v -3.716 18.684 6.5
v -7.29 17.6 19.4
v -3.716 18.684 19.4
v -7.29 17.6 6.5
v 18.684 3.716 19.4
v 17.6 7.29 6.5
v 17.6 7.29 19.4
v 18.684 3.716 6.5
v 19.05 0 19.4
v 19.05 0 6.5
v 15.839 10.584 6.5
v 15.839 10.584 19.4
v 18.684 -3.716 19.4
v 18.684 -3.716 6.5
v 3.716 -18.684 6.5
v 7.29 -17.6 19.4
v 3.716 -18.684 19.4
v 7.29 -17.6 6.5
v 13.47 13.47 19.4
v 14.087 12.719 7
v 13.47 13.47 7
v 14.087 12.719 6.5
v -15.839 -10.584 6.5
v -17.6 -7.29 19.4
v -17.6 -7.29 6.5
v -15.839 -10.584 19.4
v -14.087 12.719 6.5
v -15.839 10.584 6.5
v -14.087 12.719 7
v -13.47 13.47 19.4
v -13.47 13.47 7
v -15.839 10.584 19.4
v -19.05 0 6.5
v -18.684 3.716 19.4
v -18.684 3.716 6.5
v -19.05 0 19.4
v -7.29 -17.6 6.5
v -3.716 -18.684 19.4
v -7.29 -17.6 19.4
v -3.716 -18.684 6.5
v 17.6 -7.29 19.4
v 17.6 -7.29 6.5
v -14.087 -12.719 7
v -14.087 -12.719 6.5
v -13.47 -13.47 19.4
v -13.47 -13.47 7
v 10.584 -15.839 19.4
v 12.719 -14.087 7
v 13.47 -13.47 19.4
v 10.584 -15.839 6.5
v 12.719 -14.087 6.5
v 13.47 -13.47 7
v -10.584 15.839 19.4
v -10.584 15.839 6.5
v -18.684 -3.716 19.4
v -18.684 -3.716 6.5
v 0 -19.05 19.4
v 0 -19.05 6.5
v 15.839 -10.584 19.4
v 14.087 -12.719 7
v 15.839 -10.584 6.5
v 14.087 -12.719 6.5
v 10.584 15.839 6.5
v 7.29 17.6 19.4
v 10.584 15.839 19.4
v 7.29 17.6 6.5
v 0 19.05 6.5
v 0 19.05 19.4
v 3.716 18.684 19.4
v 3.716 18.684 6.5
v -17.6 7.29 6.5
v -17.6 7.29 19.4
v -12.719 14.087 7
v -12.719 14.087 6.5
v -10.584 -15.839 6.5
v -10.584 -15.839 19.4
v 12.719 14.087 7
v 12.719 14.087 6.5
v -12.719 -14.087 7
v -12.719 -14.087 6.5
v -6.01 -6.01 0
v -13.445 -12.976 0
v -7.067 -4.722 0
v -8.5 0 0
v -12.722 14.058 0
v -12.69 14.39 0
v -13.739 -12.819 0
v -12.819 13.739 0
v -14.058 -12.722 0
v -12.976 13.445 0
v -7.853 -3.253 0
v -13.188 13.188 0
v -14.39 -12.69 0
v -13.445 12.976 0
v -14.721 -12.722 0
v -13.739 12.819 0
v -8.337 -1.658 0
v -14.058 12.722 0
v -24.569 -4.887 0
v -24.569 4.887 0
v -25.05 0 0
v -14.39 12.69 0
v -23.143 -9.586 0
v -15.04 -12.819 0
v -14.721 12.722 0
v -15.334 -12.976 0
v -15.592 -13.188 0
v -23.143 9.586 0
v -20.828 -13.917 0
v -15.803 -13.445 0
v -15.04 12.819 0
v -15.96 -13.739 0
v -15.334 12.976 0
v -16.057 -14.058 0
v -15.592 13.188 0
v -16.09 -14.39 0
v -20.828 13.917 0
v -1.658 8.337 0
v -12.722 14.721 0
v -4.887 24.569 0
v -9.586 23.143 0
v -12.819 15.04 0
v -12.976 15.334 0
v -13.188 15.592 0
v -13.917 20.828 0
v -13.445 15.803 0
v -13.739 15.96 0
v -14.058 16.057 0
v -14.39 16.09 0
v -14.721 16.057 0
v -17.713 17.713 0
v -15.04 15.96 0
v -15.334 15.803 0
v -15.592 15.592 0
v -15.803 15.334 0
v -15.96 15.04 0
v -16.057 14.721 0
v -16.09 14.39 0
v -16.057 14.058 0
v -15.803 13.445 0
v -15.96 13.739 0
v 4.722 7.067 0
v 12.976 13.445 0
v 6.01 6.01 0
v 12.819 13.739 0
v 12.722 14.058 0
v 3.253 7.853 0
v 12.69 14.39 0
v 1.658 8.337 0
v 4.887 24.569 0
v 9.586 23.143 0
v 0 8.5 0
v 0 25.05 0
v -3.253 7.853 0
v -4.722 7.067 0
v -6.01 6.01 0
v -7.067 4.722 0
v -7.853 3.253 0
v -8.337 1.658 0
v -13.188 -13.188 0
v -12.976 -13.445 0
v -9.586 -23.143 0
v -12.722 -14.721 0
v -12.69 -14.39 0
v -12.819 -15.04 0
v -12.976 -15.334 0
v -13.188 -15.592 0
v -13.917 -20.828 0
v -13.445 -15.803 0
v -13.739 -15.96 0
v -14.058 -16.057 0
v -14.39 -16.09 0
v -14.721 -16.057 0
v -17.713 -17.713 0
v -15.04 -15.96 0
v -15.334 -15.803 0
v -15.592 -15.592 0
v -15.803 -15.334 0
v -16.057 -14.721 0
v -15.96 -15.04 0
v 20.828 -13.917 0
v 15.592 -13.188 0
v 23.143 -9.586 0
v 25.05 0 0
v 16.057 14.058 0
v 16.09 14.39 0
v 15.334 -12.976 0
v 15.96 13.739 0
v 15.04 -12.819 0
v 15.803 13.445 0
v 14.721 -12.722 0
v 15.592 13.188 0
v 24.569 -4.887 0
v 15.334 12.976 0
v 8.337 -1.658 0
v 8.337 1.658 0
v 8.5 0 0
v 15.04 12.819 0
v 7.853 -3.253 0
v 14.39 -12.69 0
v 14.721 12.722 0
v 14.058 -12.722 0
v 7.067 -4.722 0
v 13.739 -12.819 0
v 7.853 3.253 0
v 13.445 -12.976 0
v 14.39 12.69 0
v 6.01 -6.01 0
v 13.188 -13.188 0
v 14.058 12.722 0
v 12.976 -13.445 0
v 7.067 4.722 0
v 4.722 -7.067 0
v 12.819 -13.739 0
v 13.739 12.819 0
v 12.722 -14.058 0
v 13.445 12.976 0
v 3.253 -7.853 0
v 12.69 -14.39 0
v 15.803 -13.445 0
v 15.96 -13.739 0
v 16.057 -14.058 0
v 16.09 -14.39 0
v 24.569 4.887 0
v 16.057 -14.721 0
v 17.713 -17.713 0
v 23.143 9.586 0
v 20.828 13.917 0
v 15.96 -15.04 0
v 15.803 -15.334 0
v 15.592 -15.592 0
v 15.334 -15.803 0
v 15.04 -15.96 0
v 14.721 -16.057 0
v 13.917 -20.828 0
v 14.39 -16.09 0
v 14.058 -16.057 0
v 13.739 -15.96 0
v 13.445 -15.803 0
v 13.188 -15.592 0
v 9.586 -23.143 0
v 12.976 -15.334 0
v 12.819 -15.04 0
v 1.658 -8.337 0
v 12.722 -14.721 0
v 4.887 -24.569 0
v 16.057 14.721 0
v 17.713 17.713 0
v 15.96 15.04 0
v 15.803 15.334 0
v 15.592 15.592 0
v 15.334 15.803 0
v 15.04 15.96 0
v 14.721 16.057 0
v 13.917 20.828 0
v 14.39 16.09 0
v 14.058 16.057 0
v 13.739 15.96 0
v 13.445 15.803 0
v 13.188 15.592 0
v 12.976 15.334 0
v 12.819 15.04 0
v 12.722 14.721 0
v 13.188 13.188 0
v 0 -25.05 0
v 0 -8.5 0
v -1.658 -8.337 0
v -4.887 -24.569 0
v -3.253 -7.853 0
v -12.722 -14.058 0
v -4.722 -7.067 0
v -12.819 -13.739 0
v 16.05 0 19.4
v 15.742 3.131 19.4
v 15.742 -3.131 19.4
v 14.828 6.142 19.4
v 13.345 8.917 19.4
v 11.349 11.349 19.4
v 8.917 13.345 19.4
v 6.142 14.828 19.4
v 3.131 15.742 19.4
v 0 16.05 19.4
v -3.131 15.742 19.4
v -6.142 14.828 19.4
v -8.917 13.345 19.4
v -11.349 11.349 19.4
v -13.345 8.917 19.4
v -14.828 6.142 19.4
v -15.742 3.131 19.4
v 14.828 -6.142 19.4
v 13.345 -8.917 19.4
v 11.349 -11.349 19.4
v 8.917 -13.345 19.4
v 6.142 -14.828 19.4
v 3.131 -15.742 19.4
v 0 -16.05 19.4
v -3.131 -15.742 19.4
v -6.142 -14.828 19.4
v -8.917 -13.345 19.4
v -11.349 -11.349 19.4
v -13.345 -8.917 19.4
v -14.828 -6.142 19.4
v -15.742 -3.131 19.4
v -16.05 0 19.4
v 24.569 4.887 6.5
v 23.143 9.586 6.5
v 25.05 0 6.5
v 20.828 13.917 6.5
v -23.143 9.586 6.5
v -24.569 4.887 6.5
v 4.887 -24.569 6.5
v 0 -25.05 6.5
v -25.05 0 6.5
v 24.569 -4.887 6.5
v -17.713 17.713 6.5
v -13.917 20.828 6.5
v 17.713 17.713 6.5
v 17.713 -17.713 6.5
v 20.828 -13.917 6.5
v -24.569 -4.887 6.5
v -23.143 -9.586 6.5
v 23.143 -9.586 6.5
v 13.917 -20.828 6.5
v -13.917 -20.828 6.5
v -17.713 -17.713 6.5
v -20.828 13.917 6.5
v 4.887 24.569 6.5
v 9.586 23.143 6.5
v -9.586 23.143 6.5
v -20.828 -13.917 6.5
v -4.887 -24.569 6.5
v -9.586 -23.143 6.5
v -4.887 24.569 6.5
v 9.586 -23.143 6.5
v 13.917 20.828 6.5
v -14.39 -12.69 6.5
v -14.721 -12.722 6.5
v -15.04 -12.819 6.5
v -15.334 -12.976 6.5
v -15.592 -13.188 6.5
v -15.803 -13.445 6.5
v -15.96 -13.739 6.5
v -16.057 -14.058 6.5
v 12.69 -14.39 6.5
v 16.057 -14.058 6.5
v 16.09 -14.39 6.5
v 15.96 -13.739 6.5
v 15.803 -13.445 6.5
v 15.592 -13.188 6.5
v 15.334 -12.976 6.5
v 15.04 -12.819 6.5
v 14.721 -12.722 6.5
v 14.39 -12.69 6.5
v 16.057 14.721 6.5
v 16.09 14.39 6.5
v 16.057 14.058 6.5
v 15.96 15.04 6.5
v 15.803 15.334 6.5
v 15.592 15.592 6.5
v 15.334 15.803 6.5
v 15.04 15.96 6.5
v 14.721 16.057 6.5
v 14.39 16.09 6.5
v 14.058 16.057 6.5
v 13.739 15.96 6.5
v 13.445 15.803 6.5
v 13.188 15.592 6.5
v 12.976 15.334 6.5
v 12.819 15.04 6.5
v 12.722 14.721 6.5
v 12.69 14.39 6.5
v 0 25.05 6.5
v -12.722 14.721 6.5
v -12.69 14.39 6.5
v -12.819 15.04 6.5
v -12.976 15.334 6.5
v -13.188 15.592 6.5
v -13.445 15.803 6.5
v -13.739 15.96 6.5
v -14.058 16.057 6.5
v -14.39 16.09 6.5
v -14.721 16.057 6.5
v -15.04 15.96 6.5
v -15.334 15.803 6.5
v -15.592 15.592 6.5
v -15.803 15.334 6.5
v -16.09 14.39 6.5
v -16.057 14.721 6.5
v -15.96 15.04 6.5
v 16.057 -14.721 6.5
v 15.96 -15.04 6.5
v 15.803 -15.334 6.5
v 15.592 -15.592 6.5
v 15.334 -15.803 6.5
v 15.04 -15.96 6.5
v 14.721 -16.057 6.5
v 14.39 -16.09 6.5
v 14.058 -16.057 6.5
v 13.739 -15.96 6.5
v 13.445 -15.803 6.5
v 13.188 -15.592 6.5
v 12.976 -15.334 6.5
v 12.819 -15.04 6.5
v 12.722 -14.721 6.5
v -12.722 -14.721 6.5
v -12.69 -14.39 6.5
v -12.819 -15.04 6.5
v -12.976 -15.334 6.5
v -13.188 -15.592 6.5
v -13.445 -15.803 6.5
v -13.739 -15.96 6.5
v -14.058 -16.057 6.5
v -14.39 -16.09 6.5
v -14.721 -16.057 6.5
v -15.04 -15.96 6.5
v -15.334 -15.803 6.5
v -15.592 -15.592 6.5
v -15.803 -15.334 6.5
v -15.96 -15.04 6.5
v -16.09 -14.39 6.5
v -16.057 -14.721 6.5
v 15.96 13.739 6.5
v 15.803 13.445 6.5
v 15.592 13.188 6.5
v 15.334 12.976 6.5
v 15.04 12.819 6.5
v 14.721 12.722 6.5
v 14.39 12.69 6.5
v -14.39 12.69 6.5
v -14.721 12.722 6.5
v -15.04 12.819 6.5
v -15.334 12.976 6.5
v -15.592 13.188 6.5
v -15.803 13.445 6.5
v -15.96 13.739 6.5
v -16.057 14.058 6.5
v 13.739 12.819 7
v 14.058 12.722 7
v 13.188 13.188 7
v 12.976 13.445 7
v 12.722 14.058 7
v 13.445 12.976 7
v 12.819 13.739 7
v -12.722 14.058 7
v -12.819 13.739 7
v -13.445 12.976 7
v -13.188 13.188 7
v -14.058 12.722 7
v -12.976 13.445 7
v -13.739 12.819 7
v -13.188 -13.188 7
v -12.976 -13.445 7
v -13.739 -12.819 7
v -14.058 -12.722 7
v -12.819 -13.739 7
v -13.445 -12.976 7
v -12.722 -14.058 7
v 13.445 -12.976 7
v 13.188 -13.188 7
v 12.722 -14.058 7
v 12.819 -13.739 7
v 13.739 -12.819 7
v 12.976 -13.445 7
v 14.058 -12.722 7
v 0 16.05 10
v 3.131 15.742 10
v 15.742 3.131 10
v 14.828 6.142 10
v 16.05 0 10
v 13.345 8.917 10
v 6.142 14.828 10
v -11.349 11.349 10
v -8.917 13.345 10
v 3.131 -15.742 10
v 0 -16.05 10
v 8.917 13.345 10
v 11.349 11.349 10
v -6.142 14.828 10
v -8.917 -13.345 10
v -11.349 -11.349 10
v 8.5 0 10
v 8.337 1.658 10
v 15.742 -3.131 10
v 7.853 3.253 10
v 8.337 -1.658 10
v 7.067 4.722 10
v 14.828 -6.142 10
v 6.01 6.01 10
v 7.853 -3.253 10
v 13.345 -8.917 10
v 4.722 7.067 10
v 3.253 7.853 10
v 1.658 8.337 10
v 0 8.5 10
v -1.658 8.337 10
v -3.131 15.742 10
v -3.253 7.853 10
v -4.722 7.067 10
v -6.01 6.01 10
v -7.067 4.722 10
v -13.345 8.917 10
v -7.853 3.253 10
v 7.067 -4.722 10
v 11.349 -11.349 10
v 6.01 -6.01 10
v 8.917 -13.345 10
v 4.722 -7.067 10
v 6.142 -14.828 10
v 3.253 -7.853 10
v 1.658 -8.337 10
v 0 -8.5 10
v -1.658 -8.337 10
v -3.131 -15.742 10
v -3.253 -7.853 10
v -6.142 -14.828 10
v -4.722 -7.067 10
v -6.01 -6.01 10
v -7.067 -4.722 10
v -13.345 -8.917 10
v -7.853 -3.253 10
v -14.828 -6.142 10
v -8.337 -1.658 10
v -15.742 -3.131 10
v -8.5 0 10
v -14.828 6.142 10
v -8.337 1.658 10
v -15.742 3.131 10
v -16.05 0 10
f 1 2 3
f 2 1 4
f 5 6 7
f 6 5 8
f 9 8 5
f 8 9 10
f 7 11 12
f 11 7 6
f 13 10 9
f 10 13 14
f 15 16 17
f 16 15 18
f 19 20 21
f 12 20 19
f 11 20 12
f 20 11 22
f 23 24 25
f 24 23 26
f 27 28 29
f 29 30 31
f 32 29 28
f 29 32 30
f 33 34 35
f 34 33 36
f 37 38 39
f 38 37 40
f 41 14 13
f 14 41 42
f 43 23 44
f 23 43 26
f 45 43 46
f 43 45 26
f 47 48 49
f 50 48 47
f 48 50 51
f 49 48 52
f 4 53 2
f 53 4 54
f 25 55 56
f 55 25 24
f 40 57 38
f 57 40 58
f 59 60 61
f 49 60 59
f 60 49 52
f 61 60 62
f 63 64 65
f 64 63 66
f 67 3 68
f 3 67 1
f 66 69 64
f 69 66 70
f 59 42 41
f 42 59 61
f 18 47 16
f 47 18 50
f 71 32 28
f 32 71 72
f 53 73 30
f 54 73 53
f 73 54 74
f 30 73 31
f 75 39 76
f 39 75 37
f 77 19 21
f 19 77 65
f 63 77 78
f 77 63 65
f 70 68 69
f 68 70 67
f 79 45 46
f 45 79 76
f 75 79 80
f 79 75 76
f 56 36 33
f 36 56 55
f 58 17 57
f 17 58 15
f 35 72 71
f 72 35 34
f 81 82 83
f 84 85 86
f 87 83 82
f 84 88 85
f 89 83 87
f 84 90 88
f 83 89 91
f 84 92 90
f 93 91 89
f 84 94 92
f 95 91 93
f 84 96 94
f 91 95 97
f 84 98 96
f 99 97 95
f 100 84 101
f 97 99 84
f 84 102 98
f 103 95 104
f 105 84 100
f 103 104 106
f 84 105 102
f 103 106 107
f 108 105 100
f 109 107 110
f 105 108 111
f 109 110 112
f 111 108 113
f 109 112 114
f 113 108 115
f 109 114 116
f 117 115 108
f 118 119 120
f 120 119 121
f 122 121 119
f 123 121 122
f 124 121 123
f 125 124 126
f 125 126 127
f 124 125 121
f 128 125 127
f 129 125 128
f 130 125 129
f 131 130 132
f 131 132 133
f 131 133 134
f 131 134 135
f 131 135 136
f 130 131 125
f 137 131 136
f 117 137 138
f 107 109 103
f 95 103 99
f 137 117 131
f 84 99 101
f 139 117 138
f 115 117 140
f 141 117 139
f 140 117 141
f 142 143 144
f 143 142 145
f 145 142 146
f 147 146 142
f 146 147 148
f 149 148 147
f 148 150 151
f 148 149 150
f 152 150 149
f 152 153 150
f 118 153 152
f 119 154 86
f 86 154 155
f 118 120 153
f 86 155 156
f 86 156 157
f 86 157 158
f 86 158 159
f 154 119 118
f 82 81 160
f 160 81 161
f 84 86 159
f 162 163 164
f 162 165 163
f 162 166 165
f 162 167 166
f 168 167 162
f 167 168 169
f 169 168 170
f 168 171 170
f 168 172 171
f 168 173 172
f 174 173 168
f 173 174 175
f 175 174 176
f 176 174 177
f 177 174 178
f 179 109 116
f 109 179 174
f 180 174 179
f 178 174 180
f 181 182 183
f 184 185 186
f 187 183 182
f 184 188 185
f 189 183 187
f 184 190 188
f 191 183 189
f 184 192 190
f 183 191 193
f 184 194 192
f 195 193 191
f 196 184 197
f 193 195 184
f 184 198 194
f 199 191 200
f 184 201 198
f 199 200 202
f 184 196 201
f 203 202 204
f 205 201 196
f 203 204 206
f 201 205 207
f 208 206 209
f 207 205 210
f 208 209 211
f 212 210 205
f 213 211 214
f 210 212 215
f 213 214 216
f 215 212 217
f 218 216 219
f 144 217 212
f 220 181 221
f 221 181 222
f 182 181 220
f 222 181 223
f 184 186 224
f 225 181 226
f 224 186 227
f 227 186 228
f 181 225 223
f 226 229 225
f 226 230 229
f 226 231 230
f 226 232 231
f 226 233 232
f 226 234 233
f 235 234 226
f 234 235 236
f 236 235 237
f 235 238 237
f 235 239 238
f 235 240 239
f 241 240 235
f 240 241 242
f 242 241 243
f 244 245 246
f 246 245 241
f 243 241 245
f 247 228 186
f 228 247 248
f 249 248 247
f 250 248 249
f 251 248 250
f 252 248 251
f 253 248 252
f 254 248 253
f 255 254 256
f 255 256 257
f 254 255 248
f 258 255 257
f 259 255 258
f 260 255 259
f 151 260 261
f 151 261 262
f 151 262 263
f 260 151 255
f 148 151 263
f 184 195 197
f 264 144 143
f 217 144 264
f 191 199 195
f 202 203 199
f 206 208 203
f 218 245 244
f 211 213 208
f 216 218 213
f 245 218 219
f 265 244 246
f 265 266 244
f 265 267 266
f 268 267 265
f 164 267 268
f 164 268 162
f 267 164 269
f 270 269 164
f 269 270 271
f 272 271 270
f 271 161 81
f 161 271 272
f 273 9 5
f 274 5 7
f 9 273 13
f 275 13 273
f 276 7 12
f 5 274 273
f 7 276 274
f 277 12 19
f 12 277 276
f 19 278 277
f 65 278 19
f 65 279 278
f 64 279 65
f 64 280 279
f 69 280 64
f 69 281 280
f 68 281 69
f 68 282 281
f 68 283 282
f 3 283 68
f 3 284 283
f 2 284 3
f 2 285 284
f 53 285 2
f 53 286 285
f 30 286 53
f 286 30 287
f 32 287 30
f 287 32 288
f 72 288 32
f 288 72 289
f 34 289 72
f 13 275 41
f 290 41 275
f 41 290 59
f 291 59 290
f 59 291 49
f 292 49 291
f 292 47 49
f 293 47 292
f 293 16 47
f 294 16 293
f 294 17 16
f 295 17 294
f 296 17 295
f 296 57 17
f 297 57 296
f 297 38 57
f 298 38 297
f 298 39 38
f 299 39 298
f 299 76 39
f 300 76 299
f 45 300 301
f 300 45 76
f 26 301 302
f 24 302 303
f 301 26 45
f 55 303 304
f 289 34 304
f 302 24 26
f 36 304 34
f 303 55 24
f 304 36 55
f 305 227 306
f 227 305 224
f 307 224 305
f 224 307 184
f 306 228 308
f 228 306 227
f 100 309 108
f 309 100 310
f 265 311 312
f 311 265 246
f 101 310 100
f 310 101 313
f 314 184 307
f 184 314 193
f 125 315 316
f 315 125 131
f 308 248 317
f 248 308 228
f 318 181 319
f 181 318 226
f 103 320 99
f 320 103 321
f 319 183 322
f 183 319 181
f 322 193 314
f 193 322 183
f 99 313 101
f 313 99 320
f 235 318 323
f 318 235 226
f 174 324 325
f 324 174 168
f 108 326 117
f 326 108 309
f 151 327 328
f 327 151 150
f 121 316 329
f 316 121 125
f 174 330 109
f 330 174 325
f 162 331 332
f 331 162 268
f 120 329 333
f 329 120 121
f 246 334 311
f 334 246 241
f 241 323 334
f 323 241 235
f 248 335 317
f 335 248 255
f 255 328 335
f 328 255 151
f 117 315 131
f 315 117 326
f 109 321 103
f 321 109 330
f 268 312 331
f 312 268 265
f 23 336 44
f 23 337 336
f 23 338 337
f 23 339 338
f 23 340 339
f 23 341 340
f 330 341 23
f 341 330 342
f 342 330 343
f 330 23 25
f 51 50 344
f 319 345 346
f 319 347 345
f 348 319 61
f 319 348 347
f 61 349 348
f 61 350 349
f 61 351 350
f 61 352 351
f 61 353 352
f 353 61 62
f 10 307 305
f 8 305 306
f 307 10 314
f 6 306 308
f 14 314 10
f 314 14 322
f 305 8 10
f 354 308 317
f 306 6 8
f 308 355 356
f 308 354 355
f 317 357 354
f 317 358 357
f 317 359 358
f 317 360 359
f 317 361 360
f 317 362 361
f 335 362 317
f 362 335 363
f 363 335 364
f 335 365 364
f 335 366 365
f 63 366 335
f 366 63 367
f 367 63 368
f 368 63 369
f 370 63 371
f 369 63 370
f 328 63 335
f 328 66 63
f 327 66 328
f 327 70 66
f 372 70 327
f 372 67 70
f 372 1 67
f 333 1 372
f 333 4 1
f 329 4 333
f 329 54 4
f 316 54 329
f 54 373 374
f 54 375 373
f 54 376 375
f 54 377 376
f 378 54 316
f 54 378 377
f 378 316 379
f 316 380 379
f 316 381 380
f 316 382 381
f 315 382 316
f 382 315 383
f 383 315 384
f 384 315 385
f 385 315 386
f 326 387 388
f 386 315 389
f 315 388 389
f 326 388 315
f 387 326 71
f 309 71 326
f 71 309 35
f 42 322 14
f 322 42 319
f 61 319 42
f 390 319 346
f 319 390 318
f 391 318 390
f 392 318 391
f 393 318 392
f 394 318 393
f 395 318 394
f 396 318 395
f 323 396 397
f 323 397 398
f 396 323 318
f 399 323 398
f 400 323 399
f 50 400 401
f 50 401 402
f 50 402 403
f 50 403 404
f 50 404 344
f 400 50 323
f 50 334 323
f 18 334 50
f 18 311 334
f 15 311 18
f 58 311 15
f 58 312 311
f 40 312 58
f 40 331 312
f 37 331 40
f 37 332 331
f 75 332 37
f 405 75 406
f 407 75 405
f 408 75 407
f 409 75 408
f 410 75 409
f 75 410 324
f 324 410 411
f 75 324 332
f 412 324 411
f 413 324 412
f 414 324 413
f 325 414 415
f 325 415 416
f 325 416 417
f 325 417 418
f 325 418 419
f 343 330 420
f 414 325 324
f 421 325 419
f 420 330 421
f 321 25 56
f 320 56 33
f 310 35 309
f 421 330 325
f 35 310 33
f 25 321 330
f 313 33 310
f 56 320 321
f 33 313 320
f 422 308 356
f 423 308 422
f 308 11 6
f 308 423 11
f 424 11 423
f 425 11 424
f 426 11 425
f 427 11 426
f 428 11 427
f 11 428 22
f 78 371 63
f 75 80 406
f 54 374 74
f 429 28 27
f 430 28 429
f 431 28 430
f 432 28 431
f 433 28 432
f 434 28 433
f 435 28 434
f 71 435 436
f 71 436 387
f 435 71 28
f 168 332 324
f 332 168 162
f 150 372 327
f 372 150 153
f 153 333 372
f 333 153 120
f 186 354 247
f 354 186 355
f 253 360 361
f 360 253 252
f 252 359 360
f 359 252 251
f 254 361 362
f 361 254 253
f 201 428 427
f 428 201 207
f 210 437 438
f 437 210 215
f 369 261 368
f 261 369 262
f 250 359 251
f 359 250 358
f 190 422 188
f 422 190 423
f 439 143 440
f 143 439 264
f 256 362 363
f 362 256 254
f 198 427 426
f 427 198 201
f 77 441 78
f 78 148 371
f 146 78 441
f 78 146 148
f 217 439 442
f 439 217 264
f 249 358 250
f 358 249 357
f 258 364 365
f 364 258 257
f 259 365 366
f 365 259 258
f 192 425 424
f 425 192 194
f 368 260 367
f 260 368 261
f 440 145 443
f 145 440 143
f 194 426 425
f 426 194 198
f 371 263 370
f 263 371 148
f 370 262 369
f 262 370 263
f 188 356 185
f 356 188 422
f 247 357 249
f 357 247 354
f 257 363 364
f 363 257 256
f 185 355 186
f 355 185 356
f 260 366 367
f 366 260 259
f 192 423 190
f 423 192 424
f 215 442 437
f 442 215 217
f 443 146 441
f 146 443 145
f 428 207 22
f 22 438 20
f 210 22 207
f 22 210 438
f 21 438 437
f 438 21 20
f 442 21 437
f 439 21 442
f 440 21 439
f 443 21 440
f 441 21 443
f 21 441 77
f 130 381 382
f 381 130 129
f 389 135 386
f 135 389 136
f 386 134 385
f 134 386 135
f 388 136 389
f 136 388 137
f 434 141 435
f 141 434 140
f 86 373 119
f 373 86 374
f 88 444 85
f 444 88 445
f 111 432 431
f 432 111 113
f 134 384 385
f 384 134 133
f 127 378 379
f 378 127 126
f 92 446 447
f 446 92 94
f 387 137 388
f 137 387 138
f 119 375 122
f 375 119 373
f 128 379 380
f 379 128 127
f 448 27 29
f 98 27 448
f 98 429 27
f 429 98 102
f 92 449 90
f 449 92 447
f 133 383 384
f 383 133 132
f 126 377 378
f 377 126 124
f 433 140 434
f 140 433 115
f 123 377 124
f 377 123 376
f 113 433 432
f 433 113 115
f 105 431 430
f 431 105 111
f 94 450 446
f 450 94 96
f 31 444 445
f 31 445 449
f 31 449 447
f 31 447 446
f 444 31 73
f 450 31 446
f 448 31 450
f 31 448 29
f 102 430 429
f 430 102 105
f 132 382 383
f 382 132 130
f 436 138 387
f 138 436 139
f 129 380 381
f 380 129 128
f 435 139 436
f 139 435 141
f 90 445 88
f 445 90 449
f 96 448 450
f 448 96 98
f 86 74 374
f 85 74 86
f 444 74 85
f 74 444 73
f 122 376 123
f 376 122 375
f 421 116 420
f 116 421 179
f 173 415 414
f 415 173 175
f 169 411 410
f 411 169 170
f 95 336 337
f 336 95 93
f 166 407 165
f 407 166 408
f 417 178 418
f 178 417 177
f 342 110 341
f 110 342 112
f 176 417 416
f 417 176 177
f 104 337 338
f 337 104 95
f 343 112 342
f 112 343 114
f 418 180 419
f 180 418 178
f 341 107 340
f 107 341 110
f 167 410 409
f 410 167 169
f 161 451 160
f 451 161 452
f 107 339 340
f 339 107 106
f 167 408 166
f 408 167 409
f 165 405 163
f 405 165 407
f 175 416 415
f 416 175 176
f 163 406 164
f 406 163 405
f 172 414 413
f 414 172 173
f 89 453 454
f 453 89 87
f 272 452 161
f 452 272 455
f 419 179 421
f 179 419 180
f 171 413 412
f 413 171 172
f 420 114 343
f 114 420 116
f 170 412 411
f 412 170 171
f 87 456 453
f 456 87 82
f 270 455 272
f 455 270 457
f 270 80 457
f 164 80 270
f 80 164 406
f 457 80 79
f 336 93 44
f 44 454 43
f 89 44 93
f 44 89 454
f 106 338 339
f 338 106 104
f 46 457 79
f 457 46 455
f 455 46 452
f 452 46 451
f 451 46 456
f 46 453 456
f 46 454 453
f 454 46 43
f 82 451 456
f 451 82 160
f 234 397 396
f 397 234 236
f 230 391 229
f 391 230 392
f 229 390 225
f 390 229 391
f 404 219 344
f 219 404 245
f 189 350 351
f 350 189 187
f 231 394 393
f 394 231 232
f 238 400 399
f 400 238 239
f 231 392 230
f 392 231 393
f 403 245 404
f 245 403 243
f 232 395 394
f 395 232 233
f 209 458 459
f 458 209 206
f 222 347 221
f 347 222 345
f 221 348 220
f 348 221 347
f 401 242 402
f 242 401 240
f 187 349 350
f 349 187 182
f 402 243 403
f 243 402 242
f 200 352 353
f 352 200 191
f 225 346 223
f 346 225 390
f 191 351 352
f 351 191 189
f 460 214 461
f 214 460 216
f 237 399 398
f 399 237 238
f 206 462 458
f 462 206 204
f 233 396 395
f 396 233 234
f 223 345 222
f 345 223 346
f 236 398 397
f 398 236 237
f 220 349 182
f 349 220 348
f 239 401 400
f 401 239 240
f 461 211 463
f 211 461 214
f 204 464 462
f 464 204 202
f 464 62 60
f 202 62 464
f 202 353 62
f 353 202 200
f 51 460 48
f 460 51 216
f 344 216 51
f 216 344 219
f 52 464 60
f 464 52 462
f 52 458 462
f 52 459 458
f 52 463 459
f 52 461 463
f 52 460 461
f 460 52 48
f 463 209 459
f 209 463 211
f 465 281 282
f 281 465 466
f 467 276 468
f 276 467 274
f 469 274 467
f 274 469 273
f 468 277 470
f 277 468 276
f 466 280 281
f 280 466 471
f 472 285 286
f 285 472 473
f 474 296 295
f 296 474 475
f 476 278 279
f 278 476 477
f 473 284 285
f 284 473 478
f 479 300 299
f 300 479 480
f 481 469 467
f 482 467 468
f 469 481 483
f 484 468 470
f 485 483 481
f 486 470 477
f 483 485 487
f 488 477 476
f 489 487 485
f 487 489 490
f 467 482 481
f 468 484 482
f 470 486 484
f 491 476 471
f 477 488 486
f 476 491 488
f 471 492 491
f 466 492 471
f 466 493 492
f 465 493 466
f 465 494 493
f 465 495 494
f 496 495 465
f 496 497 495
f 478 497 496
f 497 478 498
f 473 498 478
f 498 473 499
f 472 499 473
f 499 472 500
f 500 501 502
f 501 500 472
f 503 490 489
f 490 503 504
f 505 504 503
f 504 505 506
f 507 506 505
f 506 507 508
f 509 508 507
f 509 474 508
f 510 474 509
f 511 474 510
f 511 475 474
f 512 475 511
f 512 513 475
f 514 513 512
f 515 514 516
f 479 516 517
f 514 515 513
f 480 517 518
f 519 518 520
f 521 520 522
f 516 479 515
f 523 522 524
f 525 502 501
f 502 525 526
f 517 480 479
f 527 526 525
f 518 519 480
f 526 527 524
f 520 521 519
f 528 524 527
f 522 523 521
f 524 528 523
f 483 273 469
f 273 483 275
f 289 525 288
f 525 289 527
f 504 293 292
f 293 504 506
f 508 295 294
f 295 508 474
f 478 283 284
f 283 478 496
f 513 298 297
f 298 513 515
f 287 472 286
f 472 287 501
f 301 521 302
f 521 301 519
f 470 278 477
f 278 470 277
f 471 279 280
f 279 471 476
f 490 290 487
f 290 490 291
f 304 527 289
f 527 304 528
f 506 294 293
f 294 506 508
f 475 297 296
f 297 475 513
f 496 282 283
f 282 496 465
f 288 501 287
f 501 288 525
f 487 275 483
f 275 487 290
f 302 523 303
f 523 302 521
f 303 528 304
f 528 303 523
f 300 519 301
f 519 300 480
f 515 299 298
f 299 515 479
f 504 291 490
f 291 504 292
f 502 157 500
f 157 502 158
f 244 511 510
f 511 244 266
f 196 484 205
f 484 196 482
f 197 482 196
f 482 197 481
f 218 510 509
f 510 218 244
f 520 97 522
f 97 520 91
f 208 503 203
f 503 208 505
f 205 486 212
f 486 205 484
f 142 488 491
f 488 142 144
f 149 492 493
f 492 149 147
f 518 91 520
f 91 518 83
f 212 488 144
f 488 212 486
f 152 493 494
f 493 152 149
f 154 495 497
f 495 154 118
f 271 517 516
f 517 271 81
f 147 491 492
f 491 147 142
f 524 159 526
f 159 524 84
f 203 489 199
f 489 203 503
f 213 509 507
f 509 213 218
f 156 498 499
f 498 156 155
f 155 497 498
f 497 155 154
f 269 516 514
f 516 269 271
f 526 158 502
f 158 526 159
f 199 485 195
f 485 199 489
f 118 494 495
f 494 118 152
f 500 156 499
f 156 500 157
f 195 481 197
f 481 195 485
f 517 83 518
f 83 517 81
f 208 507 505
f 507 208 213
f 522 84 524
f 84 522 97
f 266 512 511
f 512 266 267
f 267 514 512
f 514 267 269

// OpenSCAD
$fn = 32;

// ----------------------------------------------------------------------
// Bearing housing: seat for 6002 (32 x 9 mm), 38.1 mm body
// ----------------------------------------------------------------------

// --- parameters (mm) ---
housing_d = 38.1;         // housing outside diameter
housing_h = 19.4;         // overall housing height
wall_t = 3;               // wall thickness
seat_d = 32.1;            // 6002 seat, 0.1 mm clearance
seat_h = 9.4;             // pocket depth
shoulder = 5;             // shoulder under the bearing
pass_d = 17;              // shaft passage
flange_d = 50.1;          // mounting flange diameter
flange_t = 5;             // flange thickness
bolt_d = 3.4;             // flange bolt clearance
bolt_r = 20.35;           // flange bolt circle radius

module body() {
  cylinder(h = housing_h, d = housing_d);
}

module flange() {
  /* flange sunk 1.5 mm into the body */
  cylinder(h = flange_t + 1.5, d = flange_d);
}

difference() {
  union() {
    body();
    flange();
  }
  translate([0, 0, housing_h - seat_h]) cylinder(h = seat_h + 1, d = seat_d);
  translate([0, 0, -1]) cylinder(h = housing_h - seat_h + 1, d = pass_d);
  for (i = [0 : 3]) rotate([0, 0, 45 + i * 90]) translate([bolt_r, 0, -1])
    cylinder(h = flange_t + 3, d = bolt_d);
}
